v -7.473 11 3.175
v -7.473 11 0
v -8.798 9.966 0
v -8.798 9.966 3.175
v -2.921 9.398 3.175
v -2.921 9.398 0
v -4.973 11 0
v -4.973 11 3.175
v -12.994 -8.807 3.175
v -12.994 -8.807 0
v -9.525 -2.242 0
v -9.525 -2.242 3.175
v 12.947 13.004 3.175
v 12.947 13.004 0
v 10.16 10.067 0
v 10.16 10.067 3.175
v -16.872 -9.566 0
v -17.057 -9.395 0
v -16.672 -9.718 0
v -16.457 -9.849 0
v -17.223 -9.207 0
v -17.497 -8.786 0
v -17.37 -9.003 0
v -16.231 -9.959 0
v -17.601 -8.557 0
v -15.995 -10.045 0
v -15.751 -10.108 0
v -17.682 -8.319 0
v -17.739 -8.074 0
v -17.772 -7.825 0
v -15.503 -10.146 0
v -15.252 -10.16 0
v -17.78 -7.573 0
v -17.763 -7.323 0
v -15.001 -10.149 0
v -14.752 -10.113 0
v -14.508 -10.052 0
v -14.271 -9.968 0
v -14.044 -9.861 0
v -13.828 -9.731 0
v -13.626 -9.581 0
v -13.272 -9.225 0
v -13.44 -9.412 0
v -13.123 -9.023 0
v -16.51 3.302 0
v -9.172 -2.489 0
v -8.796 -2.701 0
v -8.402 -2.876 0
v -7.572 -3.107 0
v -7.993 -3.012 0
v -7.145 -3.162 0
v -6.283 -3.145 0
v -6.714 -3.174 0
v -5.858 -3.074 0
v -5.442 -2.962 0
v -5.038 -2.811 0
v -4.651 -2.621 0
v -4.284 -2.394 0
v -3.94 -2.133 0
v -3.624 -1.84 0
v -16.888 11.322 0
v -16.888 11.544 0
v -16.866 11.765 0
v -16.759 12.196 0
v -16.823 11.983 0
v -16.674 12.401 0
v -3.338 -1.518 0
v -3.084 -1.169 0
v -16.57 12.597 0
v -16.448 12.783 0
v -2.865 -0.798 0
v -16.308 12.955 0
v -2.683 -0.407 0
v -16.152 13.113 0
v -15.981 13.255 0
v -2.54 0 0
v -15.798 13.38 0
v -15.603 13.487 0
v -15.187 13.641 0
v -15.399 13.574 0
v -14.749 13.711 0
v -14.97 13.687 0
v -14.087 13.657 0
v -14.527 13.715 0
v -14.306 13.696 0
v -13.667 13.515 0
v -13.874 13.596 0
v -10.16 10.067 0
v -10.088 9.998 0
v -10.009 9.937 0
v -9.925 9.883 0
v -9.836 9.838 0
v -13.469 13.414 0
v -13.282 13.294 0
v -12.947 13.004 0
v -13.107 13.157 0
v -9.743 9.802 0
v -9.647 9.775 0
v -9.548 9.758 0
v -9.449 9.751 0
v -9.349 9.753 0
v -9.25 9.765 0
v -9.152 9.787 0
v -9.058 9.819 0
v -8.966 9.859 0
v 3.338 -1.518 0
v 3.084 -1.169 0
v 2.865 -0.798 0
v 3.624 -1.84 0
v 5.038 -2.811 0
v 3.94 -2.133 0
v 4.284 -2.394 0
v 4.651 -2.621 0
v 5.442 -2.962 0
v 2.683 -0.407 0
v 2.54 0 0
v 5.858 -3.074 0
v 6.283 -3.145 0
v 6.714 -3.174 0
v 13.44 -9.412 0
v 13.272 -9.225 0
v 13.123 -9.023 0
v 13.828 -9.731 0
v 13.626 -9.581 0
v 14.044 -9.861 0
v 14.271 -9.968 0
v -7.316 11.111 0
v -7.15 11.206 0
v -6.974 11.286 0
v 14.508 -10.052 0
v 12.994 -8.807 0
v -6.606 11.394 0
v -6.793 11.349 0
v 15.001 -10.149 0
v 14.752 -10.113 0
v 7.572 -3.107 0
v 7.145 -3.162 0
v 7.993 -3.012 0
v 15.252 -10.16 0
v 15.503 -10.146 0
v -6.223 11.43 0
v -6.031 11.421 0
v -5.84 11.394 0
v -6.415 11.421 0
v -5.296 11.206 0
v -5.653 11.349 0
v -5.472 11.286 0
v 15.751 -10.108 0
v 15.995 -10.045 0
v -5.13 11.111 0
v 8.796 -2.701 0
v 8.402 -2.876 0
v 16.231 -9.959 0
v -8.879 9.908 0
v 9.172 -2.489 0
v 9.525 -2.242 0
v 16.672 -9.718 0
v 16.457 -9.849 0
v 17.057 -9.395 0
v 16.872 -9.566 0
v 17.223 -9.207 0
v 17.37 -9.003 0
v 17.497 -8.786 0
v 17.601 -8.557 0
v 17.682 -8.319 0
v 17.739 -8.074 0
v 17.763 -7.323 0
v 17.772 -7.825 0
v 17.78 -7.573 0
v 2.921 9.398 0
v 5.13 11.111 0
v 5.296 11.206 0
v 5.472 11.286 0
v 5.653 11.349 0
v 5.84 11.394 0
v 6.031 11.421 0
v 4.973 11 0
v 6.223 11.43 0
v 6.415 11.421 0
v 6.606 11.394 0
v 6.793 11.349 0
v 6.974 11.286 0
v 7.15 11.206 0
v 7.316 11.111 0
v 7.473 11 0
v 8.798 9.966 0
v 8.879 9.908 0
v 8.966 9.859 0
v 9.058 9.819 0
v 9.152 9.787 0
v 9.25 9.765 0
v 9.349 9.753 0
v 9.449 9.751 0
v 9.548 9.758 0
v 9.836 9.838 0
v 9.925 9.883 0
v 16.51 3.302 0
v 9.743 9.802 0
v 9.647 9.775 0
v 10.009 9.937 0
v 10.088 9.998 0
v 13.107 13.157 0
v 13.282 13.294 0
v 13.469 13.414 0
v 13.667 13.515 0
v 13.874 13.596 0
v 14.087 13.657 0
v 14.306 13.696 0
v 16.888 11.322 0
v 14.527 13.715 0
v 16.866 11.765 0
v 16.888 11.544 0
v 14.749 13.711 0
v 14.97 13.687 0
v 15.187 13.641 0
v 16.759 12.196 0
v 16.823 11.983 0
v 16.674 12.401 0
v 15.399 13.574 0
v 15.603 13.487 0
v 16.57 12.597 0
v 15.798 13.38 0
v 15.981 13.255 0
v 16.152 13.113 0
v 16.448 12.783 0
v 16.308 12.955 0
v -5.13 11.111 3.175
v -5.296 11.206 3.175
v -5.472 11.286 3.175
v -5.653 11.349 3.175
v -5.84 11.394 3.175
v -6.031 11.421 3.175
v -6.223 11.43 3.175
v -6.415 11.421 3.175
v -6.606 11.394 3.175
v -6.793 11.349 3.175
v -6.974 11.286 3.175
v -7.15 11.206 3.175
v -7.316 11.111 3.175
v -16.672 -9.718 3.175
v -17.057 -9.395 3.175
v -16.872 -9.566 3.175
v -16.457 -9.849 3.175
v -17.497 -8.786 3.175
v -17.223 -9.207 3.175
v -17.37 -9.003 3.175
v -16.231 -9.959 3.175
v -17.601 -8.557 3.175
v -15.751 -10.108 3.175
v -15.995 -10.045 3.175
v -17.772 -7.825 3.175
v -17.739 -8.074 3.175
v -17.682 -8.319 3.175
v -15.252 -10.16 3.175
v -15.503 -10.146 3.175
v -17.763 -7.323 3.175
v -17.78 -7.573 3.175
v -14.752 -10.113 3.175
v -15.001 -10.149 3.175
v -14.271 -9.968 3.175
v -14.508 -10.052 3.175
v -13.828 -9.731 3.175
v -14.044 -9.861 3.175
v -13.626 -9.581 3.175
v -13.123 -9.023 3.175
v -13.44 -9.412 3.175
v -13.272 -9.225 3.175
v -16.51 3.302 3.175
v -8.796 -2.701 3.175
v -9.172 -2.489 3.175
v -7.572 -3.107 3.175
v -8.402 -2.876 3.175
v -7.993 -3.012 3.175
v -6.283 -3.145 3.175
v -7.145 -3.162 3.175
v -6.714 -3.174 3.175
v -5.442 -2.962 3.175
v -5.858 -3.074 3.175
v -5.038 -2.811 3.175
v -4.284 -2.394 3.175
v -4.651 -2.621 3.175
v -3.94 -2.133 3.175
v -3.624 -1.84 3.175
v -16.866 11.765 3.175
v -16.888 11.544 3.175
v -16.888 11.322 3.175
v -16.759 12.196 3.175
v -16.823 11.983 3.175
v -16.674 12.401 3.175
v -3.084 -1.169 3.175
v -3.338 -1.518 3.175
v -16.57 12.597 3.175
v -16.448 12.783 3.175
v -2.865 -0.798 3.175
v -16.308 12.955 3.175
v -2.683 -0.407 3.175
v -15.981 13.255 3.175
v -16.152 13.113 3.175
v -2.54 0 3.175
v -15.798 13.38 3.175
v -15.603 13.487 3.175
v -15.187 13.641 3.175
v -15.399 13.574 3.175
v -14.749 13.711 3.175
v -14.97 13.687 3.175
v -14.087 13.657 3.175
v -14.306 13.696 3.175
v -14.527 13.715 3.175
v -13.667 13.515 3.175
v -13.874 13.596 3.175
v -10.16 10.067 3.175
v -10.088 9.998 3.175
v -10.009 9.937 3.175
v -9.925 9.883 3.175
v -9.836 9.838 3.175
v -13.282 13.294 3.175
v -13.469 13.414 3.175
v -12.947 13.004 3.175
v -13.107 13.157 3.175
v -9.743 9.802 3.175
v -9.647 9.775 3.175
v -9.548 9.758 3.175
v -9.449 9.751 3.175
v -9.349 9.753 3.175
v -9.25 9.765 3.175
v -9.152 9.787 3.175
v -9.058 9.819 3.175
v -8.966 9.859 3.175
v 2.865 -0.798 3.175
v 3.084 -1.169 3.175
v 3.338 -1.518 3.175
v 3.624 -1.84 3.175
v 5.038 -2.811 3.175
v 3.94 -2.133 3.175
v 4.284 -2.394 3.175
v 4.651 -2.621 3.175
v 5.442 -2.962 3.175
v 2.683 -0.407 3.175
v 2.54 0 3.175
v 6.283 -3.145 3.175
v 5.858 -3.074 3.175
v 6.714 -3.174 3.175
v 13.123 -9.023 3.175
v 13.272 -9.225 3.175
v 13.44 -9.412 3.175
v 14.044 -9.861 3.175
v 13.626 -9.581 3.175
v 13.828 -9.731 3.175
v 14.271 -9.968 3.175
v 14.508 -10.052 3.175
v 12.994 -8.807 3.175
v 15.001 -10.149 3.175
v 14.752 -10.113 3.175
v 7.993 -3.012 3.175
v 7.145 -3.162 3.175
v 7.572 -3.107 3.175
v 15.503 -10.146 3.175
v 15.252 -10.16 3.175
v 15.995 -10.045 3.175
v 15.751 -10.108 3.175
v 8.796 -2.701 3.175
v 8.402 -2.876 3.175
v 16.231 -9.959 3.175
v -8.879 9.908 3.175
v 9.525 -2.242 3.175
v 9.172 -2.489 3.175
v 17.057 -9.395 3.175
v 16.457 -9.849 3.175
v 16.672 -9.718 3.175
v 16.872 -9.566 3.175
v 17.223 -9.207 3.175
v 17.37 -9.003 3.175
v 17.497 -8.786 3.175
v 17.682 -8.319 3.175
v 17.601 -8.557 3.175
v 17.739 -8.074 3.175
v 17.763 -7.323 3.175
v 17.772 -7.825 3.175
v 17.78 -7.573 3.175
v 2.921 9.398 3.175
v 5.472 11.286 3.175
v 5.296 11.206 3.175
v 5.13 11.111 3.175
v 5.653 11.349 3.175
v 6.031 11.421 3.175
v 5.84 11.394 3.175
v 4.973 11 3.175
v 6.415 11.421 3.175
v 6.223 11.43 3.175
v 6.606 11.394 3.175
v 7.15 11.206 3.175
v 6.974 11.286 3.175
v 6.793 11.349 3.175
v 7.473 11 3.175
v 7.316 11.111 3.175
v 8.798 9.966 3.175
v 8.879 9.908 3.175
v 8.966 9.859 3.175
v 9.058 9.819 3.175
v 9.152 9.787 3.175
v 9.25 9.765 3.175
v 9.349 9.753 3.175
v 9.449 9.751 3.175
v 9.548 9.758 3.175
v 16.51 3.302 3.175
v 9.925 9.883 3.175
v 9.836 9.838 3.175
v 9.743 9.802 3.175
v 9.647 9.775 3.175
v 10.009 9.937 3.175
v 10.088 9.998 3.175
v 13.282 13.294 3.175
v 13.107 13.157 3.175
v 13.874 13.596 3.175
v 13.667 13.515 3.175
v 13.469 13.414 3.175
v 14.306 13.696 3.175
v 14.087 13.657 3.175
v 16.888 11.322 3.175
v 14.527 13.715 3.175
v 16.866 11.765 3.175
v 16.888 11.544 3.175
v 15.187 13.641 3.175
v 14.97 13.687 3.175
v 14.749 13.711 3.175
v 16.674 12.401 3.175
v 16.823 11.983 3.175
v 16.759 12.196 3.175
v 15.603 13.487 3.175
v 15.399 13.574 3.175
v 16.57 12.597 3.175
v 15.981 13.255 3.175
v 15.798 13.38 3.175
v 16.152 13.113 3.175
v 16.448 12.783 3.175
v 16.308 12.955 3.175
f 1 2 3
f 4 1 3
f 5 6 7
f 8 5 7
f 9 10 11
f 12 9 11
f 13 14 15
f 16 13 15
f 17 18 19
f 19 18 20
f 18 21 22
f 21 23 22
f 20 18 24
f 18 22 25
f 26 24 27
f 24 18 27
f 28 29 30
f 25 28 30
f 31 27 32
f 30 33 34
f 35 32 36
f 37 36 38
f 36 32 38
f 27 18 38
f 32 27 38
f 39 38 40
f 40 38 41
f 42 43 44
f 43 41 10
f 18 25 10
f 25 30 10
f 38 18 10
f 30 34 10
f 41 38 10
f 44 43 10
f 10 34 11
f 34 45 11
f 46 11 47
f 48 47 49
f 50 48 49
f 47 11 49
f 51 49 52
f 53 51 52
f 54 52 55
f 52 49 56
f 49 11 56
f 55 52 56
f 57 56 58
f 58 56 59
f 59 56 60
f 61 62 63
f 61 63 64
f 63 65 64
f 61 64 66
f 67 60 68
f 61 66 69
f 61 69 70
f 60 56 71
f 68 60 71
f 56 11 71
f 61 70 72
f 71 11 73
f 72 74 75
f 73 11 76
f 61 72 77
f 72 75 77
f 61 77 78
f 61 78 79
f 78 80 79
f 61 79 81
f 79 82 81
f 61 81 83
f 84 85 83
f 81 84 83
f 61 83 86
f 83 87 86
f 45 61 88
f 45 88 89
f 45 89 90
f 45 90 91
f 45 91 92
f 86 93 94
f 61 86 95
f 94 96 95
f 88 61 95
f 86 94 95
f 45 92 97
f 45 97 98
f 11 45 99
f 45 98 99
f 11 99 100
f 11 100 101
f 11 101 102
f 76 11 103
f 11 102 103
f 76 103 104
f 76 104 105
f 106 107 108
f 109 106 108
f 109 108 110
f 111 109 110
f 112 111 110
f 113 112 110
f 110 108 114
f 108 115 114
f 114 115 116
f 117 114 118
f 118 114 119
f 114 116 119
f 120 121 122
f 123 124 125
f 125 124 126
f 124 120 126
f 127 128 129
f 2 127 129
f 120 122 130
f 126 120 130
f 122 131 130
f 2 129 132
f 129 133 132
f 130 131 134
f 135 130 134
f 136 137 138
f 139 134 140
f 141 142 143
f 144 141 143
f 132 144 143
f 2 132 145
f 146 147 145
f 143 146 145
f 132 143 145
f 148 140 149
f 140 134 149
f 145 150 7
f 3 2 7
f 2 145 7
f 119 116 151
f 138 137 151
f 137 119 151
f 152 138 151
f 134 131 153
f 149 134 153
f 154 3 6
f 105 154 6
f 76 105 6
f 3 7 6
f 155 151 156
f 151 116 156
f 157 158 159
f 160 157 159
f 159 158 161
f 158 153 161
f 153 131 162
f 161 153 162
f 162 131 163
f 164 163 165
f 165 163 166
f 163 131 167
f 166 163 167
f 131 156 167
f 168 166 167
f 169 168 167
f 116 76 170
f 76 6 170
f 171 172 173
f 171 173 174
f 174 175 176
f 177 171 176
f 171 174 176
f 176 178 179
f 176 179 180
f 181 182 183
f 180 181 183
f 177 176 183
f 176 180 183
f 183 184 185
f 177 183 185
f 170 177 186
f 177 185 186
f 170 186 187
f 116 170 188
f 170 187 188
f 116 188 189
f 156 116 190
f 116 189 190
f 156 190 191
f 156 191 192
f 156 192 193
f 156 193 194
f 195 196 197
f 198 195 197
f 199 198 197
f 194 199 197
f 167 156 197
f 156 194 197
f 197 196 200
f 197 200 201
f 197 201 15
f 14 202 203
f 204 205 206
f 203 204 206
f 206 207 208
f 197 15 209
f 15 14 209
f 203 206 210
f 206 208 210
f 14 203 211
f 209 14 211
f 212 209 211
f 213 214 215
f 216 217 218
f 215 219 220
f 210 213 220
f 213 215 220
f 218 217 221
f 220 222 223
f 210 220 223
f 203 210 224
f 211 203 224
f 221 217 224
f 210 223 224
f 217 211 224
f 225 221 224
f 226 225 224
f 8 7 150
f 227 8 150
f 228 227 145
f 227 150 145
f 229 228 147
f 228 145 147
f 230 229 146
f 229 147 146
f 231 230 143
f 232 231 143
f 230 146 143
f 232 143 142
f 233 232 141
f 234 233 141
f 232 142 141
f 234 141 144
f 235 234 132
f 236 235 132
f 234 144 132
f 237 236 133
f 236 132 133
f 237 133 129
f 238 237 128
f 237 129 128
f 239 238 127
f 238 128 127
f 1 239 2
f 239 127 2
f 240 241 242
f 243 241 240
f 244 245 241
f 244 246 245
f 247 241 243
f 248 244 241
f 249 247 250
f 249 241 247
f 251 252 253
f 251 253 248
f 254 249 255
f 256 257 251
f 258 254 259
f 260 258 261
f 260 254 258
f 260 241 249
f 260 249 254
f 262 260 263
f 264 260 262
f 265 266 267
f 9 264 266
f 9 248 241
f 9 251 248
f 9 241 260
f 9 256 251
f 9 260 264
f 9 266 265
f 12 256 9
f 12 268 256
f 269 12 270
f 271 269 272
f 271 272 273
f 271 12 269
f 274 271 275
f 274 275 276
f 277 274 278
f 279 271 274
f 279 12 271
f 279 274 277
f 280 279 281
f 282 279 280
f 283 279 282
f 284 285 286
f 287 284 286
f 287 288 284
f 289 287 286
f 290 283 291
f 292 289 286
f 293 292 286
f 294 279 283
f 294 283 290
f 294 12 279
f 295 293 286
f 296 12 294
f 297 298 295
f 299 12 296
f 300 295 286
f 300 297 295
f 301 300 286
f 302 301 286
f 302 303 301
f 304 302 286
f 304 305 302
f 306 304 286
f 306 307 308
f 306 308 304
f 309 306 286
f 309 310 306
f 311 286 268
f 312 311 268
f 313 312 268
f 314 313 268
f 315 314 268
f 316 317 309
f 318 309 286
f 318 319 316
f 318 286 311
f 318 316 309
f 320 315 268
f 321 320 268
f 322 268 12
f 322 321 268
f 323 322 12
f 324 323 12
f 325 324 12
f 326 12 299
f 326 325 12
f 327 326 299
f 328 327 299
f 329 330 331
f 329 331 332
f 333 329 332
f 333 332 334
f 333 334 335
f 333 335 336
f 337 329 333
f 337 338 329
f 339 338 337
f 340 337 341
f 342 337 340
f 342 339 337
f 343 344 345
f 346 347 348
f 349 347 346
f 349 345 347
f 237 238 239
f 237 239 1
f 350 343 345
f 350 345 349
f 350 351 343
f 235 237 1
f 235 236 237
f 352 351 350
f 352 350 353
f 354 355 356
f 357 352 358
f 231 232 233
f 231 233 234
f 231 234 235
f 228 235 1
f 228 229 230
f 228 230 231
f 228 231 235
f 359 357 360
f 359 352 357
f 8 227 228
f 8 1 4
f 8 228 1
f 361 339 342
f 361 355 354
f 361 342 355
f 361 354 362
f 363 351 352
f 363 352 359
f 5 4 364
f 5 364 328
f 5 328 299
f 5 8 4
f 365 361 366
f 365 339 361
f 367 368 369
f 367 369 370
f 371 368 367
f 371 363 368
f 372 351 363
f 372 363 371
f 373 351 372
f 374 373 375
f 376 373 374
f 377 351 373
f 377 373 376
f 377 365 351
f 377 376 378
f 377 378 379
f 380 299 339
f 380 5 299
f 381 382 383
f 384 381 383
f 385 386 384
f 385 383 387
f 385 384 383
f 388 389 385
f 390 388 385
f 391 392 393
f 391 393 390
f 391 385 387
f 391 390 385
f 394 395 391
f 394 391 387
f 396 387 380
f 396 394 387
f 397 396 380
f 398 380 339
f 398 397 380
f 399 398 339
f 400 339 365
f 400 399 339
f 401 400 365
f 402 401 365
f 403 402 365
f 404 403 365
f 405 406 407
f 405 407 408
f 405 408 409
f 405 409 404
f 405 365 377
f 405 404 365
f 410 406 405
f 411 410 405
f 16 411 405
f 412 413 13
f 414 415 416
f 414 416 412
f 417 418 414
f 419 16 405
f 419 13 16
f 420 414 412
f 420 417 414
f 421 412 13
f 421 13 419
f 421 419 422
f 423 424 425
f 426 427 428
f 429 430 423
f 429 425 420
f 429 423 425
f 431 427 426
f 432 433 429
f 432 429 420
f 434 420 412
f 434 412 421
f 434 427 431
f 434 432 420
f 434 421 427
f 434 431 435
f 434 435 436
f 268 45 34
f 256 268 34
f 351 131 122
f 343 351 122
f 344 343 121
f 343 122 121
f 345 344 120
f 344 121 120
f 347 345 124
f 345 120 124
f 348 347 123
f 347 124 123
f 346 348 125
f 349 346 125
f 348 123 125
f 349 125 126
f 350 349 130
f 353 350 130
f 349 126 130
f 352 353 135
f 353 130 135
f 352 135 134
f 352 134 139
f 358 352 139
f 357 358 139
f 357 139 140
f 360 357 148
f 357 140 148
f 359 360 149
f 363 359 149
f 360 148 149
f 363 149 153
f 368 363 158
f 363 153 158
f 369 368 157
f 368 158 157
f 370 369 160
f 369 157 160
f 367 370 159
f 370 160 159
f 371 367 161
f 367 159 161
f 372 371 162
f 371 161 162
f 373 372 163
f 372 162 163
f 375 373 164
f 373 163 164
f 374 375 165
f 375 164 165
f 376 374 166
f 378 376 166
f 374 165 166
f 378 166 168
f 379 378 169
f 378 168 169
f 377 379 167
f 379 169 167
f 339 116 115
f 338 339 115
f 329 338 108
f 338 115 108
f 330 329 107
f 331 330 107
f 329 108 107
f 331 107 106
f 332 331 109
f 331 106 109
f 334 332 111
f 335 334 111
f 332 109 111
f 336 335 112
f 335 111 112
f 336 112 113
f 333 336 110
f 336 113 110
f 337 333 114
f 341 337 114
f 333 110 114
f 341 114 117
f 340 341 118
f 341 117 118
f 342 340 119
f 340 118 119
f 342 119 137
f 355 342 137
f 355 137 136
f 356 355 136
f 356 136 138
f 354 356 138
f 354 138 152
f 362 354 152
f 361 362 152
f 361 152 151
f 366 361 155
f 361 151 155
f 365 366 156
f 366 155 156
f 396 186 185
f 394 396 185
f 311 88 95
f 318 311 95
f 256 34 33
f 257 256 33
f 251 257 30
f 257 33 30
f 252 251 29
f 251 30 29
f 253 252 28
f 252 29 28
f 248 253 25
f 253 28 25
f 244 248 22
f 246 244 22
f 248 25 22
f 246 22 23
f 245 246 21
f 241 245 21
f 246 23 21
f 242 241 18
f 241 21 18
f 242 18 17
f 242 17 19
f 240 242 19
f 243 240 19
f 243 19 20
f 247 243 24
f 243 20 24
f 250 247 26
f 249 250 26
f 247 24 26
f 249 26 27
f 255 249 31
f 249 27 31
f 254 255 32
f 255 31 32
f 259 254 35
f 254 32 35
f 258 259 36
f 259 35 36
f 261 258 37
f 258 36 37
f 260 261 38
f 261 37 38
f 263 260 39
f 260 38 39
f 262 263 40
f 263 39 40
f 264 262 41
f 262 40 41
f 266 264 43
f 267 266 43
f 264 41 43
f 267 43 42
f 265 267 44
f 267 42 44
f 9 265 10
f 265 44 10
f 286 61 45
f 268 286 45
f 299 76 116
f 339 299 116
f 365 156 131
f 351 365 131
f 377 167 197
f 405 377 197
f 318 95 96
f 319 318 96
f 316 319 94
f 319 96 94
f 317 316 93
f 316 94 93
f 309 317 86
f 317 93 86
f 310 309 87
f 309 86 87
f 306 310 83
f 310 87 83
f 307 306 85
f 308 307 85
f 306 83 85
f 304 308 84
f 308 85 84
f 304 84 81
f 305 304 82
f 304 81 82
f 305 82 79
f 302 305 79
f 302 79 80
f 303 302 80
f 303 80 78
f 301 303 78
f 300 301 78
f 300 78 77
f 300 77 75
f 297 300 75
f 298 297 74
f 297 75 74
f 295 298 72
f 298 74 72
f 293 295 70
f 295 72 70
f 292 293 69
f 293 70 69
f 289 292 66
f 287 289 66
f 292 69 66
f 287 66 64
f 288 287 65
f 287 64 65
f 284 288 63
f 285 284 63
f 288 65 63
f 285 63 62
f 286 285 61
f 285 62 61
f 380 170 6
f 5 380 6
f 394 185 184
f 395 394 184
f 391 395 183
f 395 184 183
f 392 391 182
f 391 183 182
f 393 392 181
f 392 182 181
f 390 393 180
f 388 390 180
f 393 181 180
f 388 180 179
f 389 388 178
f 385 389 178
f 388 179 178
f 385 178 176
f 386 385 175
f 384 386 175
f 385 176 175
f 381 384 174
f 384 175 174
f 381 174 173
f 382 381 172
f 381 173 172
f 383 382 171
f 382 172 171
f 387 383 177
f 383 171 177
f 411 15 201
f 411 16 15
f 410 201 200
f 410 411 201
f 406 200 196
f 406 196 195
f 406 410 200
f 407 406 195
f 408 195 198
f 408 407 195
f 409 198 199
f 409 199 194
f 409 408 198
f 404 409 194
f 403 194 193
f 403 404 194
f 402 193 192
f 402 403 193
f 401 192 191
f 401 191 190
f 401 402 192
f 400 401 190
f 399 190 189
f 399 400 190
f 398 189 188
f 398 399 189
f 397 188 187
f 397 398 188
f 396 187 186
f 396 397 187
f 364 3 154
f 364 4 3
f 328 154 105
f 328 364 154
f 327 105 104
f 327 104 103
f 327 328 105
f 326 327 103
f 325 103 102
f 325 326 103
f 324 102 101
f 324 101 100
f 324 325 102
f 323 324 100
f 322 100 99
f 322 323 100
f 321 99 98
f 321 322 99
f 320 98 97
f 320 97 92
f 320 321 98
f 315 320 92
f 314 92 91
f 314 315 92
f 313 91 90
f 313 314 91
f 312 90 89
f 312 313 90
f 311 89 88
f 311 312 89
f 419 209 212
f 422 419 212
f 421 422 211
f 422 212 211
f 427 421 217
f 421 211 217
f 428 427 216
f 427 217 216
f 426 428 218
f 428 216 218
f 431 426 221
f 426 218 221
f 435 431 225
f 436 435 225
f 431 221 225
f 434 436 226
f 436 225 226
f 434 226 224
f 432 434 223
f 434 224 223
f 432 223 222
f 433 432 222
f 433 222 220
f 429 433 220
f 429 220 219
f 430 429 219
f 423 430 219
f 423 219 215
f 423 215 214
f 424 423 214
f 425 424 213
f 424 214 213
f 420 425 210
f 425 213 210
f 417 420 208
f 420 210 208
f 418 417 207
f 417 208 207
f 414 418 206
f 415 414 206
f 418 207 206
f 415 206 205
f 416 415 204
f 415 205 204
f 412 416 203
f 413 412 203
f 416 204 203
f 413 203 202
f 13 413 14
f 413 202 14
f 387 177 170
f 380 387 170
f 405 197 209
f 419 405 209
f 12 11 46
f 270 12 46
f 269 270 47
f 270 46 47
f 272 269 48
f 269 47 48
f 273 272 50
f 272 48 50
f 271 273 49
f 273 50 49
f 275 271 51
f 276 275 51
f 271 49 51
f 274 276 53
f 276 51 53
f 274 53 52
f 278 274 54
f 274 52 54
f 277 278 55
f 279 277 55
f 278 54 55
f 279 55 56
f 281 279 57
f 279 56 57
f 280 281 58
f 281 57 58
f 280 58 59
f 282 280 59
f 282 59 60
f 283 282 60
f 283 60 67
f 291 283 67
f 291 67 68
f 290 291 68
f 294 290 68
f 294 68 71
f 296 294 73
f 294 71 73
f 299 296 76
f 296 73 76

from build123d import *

# Parameters (mm, degrees)
PAD_DEPTH = 3.175
FILLET_R  = 1.016


with BuildPart() as part:
    # Sketch → Pad (new body)
    with BuildSketch(Plane.XY):
        with BuildLine():
            Line((-16.51, 3.302), (-17.762531, -7.32262))
            ThreePointArc((-17.762531, -7.32262), (-15.994846, -10.045244), (-12.994271, -8.806719))
            Line((-12.994271, -8.806719), (-9.525, -2.241526))
            ThreePointArc((-9.525, -2.241526), (-5.441505, -2.962411), (-2.54, 0))
            Line((-2.54, 0), (2.54, 0))
            ThreePointArc((2.54, 0), (5.441505, -2.962411), (9.525, -2.241526))
            Line((9.525, -2.241526), (12.994271, -8.806719))
            ThreePointArc((12.994271, -8.806719), (15.994846, -10.045244), (17.762531, -7.32262))
            Line((17.762531, -7.32262), (16.51, 3.302))
            Line((16.51, 3.302), (16.888459, 11.322248))
            ThreePointArc((16.888459, 11.322248), (15.501948, 13.532684), (12.946847, 13.003634))
            Line((12.946847, 13.003634), (9.525, 9.398))
            Line((9.525, 9.398), (7.473462, 10.999677))
            ThreePointArc((7.473462, 10.999677), (6.223, 11.43), (4.972538, 10.999677))
            Line((4.972538, 10.999677), (2.921, 9.398))
            Line((2.921, 9.398), (-2.921, 9.398))
            Line((-2.921, 9.398), (-4.972538, 10.999677))
            ThreePointArc((-4.972538, 10.999677), (-6.223, 11.43), (-7.473462, 10.999677))
            Line((-7.473462, 10.999677), (-9.525, 9.398))
            Line((-9.525, 9.398), (-12.946847, 13.003634))
            ThreePointArc((-12.946847, 13.003634), (-15.501948, 13.532684), (-16.888459, 11.322248))
            Line((-16.888459, 11.322248), (-16.51, 3.302))
        make_face()
    extrude(amount=PAD_DEPTH)

    # Fillet
    fillet_edges = [part.edges().sort_by_distance(p)[0] for p in [
        (-9.525, 9.398, 1.5875),
        (9.525, 9.398, 1.5875),
    ]]
    fillet(fillet_edges, radius=FILLET_R)


solid = part.part
